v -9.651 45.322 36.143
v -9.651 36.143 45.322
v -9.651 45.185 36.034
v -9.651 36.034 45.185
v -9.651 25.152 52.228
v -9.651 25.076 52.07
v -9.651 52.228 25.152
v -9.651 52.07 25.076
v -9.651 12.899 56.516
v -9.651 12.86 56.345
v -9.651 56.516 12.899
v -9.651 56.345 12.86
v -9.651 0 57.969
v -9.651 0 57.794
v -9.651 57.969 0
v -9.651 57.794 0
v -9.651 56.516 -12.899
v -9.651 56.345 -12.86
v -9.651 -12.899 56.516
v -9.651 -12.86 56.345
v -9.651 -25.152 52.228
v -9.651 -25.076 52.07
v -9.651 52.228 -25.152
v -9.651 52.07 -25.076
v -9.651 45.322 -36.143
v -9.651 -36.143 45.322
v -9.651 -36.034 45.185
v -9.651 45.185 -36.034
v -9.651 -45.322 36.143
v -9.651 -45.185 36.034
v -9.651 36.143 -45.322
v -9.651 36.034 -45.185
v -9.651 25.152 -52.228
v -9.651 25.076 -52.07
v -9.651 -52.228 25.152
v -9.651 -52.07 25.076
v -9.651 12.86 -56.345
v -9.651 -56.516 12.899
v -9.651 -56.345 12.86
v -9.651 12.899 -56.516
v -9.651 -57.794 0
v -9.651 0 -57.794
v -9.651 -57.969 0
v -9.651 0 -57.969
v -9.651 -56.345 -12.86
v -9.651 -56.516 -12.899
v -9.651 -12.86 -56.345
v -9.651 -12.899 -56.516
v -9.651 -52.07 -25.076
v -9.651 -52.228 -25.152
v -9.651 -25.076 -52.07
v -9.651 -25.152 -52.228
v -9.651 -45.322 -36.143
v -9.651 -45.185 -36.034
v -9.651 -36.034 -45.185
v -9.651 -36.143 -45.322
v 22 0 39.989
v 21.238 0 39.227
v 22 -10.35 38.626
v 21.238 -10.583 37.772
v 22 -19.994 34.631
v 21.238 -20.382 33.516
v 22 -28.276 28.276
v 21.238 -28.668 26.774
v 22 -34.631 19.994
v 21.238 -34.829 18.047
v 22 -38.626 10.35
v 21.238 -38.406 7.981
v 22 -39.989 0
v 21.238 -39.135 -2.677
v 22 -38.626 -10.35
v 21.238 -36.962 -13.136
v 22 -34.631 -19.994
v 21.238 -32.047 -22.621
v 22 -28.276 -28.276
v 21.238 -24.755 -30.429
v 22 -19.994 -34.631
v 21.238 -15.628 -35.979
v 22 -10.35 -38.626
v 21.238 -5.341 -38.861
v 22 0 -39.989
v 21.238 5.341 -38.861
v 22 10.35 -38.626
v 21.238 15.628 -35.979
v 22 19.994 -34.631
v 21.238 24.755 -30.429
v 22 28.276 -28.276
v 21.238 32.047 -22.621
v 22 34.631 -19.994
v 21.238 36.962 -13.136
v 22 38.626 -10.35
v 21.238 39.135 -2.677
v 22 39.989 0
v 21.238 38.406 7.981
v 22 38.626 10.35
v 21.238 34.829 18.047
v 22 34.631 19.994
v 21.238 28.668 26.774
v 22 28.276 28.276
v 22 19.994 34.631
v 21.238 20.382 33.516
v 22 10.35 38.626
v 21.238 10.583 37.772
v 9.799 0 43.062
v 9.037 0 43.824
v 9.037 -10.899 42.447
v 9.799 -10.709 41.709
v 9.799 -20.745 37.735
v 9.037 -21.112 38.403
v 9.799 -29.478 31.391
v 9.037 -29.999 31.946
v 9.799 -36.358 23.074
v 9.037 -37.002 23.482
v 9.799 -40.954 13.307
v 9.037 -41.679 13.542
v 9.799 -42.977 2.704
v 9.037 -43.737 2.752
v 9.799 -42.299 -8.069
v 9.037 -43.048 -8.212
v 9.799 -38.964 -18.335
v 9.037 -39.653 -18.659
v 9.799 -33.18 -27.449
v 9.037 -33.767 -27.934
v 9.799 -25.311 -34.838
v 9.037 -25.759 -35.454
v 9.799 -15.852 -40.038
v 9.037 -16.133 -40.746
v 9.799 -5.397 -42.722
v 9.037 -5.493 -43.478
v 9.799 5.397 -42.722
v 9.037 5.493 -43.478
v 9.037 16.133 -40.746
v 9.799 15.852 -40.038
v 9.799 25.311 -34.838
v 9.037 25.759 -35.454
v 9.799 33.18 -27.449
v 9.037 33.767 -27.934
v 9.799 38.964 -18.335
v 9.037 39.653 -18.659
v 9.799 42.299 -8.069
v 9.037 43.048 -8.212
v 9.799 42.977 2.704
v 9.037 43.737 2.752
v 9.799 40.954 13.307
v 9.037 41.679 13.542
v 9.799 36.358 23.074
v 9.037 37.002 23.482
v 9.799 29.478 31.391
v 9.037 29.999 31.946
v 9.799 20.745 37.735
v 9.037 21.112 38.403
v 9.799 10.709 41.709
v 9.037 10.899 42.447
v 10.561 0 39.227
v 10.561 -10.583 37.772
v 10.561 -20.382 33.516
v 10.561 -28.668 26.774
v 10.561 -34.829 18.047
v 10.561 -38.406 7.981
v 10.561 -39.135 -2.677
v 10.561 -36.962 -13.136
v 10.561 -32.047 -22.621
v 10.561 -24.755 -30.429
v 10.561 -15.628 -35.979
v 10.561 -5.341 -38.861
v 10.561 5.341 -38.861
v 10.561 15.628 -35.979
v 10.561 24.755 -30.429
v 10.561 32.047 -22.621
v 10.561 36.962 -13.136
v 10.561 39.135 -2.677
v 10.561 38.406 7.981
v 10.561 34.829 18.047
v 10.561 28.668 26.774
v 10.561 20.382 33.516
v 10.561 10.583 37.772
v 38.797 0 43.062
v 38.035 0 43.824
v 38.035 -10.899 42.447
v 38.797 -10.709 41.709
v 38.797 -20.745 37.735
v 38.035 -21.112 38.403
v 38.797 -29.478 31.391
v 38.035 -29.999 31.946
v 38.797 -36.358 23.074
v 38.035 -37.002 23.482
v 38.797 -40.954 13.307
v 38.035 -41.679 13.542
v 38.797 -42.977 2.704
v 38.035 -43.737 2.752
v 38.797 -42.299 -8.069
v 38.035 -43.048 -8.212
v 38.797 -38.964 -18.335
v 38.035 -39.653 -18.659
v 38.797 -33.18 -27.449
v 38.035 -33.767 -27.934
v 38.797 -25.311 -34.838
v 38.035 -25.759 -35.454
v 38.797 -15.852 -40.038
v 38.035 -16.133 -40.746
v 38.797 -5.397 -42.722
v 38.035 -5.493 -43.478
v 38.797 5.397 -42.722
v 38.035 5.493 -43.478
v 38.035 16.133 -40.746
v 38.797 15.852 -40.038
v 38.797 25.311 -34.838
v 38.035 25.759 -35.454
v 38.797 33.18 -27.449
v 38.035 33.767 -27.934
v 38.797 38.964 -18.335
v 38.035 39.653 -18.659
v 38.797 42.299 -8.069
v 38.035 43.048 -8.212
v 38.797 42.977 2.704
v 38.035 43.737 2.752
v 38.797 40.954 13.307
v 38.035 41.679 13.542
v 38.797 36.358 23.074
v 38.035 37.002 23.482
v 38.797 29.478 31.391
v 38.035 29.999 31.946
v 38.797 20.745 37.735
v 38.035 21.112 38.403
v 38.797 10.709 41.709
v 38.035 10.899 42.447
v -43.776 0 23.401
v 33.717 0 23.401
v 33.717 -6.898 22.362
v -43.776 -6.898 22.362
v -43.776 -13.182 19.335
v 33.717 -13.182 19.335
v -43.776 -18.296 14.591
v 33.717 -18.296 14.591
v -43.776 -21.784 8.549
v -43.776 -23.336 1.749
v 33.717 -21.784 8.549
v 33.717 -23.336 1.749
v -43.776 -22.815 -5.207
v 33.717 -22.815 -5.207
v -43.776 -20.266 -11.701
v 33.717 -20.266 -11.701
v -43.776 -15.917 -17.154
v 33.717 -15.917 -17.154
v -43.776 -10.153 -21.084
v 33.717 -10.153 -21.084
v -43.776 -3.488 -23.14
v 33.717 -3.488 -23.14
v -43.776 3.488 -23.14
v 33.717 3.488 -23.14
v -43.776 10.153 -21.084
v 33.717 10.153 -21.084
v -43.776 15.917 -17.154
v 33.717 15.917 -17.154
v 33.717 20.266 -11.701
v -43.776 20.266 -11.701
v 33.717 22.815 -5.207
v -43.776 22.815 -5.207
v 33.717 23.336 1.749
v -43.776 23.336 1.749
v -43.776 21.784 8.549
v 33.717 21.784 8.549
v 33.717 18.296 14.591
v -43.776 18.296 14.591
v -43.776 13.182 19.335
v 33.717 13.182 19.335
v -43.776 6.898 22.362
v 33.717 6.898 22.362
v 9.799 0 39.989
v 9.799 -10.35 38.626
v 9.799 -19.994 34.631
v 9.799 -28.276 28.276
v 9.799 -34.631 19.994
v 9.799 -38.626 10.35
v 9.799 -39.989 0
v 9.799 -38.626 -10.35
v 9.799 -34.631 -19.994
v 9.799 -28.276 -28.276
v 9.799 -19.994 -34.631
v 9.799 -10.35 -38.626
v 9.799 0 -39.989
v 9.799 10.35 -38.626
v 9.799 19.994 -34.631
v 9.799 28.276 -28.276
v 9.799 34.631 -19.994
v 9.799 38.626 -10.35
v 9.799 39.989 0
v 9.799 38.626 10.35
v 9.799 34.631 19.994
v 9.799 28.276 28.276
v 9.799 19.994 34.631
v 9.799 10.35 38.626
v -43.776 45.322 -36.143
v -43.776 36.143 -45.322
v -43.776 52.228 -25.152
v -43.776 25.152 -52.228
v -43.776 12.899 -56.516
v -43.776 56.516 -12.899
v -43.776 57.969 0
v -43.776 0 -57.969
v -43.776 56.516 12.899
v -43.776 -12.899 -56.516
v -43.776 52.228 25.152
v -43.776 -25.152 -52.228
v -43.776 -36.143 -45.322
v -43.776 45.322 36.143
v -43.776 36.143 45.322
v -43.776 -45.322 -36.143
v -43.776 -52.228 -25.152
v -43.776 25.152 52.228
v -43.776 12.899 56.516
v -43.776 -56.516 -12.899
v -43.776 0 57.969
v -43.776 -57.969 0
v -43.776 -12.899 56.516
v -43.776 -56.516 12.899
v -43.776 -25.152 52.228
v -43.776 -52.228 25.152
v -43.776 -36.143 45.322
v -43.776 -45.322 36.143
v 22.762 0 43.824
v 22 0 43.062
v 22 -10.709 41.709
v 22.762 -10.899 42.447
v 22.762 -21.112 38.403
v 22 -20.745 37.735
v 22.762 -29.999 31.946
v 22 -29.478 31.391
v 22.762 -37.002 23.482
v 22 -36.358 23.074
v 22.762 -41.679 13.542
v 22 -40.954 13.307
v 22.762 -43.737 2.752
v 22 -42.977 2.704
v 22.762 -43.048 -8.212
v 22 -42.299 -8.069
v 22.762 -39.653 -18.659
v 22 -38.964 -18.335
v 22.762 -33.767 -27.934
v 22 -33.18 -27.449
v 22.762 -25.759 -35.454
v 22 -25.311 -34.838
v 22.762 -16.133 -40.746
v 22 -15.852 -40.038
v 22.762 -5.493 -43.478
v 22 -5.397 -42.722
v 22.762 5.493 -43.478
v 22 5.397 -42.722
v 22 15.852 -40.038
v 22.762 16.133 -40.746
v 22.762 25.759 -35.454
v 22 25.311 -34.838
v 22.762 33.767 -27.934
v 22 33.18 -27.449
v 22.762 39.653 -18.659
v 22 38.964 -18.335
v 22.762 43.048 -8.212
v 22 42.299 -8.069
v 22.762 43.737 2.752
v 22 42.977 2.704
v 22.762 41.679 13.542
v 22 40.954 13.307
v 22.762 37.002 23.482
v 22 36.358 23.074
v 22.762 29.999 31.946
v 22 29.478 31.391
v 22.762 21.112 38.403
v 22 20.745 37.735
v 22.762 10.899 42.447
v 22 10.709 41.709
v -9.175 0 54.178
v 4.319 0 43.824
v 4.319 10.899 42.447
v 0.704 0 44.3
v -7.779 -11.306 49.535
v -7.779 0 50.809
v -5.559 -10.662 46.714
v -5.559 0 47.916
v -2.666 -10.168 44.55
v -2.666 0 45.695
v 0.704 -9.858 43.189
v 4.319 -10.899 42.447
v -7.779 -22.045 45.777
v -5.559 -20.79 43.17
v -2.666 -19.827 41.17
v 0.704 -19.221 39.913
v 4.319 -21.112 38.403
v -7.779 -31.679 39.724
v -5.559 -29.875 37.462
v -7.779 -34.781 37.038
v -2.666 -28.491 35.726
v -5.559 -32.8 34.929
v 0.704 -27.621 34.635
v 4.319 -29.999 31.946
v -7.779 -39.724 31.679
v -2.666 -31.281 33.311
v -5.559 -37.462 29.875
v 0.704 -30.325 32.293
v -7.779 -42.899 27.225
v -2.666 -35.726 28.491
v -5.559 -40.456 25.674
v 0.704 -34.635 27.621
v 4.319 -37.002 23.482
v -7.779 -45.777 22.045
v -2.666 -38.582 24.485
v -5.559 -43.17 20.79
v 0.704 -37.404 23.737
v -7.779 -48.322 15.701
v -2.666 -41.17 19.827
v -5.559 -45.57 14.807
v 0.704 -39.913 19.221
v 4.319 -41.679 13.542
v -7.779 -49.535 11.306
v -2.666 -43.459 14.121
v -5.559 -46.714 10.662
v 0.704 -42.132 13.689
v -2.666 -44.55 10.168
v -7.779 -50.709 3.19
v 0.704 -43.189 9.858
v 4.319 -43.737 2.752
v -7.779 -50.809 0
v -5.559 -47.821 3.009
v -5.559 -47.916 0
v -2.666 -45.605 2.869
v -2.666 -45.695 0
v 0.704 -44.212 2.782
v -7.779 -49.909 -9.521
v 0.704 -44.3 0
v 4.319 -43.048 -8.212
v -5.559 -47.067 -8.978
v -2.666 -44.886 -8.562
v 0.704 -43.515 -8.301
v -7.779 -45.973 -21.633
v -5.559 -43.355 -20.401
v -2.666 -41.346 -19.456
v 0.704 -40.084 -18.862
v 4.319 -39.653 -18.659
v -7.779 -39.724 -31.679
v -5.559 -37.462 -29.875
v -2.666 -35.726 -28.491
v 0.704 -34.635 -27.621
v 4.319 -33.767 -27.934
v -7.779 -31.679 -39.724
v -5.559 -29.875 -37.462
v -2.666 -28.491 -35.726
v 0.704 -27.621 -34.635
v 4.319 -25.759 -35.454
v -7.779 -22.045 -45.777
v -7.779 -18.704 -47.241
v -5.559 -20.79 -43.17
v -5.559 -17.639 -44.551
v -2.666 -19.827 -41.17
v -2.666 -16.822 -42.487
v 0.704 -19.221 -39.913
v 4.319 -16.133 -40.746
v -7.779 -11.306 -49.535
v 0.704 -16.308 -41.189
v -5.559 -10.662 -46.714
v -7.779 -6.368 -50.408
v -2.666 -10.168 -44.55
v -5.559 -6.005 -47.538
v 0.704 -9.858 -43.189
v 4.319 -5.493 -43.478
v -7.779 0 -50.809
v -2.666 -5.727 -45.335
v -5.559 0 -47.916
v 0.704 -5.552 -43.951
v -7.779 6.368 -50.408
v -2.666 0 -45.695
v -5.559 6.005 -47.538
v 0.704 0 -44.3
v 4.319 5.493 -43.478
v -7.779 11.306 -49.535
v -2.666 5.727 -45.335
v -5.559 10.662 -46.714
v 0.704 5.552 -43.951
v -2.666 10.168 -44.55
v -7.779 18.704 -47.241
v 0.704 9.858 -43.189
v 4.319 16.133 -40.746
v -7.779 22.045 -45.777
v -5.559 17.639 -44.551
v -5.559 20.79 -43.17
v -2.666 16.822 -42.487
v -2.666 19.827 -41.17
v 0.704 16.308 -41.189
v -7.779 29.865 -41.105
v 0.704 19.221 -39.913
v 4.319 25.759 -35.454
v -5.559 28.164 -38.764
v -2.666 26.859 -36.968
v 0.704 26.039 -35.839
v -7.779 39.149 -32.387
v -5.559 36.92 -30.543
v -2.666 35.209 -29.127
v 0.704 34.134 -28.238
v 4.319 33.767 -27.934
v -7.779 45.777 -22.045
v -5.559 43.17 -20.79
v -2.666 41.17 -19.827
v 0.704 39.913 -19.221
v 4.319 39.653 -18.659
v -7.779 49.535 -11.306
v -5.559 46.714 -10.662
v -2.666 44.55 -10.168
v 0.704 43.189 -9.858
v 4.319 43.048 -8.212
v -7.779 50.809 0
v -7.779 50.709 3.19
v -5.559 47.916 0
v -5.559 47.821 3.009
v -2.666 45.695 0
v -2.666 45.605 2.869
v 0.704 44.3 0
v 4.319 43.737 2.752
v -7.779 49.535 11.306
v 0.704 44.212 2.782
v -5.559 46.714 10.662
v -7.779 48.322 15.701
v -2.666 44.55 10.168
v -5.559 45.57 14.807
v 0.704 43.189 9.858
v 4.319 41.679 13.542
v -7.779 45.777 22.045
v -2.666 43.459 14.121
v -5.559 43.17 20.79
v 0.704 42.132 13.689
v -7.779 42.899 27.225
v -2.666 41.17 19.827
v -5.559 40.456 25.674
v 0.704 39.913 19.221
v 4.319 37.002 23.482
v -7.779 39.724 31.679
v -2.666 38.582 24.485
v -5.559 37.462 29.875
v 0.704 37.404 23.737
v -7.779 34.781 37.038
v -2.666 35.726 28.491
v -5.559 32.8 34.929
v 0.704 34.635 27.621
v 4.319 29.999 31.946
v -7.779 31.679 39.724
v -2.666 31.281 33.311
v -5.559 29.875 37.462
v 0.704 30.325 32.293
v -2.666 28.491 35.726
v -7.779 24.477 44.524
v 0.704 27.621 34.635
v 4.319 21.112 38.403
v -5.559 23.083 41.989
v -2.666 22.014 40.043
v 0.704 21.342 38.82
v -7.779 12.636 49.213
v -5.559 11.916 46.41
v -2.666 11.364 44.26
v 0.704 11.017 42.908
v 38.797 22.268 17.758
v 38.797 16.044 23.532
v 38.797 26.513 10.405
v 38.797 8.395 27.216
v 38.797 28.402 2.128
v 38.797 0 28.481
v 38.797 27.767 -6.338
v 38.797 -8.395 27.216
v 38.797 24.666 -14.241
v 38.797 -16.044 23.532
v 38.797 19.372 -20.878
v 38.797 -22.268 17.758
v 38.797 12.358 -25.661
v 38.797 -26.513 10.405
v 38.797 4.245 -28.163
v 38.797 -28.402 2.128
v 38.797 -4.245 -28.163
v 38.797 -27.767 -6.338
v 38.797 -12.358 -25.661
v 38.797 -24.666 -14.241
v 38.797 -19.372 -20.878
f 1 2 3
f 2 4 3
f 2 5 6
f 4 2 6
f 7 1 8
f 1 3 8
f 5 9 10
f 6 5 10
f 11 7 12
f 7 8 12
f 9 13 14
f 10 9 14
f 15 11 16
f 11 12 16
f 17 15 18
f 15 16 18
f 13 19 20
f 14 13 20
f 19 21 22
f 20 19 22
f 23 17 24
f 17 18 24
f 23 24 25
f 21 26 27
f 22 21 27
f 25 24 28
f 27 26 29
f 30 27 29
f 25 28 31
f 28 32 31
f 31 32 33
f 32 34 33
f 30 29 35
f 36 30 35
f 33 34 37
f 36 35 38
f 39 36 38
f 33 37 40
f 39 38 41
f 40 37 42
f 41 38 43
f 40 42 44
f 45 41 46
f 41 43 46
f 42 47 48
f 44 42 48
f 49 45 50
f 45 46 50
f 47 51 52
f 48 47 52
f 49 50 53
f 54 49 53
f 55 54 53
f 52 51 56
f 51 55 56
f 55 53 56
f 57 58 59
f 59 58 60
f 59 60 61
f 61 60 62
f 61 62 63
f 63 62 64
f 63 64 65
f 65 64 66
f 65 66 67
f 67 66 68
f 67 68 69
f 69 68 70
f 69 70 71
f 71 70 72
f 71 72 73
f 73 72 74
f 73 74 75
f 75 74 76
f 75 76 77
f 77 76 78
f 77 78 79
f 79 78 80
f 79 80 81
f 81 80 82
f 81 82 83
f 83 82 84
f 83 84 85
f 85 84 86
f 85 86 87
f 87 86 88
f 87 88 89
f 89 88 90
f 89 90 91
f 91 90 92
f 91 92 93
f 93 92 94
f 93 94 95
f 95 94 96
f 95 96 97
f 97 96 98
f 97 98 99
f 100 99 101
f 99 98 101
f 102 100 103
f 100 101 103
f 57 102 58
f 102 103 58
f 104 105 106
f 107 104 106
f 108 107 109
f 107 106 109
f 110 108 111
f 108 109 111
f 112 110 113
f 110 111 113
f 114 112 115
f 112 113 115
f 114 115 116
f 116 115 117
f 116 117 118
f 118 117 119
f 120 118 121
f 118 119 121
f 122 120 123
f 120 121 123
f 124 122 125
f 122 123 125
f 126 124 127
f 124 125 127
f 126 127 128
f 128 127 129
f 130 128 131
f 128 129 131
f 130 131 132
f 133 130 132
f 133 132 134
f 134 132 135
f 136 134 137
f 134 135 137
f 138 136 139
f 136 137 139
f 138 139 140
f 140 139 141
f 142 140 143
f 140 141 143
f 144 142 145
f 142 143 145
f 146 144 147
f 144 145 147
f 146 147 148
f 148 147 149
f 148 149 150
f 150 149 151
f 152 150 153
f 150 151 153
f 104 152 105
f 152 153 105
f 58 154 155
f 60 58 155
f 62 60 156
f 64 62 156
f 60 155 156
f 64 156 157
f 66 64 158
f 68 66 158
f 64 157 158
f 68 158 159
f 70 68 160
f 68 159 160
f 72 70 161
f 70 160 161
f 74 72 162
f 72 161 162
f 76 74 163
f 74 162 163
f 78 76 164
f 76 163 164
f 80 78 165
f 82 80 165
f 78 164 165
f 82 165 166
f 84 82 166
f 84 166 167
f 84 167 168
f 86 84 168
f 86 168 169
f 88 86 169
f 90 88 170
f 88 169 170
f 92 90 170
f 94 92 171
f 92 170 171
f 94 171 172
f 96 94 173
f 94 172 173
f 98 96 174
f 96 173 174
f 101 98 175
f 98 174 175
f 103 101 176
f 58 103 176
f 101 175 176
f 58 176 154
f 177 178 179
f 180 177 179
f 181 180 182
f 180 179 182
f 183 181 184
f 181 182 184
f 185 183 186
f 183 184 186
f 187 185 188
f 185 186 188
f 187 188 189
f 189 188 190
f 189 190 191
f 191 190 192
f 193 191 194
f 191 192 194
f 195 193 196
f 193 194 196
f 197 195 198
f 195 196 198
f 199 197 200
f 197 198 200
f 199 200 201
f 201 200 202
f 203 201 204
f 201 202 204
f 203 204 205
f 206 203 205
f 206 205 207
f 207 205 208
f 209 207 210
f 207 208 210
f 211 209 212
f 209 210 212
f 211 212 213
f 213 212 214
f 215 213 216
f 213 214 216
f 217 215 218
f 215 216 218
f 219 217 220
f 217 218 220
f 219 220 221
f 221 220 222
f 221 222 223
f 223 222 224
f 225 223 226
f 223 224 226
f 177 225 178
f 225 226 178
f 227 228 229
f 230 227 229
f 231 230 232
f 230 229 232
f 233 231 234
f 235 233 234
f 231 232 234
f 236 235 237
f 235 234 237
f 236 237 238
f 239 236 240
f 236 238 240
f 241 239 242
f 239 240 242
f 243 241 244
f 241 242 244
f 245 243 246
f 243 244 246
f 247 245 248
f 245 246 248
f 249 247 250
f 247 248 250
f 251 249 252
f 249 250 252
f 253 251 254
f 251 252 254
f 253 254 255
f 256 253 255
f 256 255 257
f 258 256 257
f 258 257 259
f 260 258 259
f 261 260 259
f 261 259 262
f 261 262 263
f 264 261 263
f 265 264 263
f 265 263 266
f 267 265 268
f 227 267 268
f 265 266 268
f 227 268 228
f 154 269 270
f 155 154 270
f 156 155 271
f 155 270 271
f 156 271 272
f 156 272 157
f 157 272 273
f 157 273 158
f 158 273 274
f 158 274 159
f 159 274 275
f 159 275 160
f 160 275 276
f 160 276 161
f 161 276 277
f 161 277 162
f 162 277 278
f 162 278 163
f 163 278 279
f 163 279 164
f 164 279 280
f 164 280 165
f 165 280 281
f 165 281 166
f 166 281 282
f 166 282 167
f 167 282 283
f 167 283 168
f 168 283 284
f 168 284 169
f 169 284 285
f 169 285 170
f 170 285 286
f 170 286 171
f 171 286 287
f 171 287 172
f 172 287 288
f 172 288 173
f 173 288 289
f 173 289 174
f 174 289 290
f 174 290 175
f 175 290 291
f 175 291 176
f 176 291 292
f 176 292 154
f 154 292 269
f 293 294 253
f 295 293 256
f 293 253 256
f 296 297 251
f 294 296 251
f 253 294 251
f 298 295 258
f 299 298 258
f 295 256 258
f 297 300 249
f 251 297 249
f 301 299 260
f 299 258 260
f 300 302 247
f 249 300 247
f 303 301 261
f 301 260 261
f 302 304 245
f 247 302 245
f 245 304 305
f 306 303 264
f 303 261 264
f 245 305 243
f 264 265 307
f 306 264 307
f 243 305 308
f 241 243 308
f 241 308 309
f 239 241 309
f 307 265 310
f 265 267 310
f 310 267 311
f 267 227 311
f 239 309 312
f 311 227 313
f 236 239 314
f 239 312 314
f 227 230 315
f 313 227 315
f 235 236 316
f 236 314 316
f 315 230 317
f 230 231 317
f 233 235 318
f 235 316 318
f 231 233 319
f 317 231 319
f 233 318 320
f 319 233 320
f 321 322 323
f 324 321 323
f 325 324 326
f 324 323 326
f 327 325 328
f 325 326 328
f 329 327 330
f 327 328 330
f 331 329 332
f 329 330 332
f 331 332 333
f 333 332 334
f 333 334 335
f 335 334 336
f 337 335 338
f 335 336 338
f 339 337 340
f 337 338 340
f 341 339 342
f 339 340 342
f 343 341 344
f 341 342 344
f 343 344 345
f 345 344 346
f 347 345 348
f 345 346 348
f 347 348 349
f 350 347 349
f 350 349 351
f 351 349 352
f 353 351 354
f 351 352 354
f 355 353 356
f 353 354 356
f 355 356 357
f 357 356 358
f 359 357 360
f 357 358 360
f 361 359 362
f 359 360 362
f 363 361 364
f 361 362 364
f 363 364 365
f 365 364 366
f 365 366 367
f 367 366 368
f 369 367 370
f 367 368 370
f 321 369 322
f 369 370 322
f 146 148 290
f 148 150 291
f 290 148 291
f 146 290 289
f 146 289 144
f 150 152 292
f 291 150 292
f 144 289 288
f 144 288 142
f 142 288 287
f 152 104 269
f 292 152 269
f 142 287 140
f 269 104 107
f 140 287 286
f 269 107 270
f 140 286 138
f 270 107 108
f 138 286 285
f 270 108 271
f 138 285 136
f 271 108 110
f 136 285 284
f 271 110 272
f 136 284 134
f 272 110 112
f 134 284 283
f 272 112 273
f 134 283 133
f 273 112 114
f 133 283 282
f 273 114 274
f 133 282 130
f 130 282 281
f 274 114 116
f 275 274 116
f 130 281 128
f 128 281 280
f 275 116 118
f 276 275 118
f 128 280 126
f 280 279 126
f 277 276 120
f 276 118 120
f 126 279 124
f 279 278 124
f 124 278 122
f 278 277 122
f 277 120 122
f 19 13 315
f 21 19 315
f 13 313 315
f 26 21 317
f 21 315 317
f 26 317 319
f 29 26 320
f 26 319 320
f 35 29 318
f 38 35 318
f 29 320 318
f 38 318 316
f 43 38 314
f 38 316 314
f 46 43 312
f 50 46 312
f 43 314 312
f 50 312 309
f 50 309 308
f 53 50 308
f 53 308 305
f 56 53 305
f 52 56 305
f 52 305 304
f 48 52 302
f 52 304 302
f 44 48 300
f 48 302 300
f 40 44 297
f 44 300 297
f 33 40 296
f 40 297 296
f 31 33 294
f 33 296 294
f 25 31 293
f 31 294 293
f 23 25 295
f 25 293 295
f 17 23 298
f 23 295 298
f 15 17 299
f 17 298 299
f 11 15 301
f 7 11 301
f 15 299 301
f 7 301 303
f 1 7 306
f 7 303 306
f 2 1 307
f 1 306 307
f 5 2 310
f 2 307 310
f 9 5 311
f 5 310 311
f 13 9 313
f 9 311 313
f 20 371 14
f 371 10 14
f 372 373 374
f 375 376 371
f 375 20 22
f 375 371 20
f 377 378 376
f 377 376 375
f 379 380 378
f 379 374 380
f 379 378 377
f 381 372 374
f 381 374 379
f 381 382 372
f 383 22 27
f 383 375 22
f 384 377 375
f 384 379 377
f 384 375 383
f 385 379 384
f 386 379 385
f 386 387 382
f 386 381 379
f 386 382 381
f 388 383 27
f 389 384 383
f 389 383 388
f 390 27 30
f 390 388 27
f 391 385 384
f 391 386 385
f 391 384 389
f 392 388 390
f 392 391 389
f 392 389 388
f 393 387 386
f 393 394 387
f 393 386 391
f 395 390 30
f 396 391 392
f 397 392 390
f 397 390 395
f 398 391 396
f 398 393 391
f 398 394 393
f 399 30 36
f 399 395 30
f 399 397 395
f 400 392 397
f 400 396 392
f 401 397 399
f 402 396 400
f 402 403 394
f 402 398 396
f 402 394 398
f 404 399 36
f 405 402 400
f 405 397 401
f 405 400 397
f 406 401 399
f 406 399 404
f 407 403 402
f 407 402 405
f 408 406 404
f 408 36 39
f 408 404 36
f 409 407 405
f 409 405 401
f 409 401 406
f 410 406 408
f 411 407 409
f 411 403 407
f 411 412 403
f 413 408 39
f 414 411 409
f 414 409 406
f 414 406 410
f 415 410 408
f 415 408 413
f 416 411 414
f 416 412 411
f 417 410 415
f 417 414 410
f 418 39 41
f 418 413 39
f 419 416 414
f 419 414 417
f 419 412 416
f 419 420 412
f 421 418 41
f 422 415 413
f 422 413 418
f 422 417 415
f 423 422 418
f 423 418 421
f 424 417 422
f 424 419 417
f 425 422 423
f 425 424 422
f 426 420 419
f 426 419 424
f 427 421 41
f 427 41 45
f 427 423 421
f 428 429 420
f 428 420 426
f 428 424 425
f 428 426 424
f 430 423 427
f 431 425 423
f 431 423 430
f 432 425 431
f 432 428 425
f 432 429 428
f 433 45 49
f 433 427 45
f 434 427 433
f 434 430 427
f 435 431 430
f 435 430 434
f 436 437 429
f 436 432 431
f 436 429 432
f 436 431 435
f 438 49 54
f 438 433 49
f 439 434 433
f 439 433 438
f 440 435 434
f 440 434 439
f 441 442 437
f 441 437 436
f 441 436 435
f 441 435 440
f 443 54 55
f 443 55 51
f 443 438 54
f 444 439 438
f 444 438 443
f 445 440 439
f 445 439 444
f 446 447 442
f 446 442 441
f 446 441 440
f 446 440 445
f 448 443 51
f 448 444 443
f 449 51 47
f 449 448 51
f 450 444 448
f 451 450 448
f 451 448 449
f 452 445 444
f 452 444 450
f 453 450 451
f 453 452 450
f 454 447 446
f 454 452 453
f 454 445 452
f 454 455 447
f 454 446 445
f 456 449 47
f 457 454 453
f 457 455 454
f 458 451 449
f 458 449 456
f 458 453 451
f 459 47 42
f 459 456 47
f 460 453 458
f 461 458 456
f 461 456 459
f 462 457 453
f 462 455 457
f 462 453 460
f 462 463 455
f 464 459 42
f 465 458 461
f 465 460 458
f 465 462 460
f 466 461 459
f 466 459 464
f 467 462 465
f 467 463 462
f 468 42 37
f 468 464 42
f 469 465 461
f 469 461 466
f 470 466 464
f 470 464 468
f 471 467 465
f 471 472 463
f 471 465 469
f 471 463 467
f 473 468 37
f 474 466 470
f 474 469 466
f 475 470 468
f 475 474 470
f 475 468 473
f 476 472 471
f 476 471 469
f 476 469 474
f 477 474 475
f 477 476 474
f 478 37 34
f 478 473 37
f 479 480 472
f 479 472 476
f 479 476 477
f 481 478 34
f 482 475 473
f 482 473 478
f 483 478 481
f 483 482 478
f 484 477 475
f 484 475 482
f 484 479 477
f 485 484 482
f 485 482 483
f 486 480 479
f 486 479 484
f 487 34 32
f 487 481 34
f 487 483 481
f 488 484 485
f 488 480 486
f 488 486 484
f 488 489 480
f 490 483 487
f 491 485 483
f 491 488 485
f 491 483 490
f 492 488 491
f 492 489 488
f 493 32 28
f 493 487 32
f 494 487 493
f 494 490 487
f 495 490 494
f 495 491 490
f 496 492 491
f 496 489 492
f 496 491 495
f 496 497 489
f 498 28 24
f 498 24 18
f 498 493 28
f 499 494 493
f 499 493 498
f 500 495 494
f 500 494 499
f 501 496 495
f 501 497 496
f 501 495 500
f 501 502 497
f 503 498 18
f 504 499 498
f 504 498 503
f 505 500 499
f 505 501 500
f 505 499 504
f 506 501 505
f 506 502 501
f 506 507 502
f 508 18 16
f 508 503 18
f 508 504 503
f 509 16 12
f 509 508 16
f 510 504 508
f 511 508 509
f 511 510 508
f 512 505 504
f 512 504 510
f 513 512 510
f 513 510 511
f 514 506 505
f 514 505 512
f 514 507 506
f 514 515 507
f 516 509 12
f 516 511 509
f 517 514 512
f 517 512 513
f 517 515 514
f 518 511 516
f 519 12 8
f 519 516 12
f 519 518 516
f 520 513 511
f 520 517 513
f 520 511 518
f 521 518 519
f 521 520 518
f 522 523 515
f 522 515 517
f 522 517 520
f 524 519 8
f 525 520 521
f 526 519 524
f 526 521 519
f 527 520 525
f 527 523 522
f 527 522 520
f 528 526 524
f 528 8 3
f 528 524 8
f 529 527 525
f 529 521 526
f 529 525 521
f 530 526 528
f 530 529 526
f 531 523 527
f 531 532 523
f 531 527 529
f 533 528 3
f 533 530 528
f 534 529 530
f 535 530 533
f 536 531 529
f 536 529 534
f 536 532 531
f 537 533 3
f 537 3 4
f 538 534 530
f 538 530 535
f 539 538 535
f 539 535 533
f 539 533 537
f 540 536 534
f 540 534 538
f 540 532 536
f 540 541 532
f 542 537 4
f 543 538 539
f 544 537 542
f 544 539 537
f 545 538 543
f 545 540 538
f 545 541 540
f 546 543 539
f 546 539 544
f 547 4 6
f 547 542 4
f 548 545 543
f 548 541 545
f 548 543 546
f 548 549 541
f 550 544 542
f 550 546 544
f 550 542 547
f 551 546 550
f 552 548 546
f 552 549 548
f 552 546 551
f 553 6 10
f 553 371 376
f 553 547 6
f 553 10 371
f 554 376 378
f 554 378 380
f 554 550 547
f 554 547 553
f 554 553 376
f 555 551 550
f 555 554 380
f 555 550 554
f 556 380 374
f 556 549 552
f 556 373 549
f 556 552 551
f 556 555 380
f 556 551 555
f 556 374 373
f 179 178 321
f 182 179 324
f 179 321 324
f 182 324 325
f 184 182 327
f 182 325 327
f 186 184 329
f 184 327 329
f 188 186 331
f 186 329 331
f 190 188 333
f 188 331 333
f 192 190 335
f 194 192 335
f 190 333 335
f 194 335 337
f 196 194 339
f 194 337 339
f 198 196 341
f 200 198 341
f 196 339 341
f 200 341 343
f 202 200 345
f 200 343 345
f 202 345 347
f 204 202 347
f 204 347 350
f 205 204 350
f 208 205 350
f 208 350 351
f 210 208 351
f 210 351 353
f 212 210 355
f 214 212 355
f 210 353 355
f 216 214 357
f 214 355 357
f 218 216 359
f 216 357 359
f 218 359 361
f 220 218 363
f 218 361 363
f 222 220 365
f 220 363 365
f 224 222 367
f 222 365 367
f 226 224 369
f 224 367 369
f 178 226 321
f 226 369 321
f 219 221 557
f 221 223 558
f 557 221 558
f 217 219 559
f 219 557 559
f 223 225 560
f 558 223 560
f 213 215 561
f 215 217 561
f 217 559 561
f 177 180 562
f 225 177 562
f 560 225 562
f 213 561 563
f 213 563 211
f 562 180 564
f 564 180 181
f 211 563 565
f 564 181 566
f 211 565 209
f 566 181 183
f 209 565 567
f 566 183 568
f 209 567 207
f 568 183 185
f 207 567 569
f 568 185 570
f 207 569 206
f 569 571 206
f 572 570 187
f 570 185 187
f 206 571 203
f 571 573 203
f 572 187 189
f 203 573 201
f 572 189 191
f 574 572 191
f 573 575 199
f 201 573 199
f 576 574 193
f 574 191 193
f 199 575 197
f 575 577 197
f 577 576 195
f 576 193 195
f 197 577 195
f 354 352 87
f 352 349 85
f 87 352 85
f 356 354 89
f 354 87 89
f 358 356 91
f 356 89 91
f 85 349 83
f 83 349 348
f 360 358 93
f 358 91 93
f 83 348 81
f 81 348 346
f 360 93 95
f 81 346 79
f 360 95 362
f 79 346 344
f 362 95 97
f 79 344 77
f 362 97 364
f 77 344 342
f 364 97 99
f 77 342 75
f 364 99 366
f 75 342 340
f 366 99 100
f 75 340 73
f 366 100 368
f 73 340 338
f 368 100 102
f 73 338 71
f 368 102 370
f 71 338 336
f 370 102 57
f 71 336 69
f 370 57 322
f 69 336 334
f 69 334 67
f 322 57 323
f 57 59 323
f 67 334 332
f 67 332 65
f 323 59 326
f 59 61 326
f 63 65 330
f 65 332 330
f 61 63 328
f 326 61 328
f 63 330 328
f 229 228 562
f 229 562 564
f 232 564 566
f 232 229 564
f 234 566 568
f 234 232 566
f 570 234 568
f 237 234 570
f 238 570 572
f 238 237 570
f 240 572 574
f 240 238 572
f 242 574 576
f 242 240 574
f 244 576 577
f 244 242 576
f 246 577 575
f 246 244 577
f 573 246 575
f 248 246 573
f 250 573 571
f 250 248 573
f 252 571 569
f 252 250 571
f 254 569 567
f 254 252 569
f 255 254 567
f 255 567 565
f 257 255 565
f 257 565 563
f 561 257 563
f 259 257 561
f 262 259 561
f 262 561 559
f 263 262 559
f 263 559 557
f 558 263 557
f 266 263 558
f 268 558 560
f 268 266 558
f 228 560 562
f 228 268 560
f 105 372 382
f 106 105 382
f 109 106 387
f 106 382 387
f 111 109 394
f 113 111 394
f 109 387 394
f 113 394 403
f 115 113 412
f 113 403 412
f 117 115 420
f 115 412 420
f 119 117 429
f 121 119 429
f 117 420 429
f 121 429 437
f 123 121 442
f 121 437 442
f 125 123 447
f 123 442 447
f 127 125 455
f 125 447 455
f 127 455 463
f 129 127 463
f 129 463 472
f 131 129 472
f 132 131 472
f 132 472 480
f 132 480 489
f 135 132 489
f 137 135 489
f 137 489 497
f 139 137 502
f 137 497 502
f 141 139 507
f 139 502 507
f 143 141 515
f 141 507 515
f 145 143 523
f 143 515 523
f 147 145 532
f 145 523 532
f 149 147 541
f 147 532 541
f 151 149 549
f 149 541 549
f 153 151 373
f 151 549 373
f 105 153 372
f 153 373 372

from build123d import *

# Parameters (mm, degrees)
F2_SIZE = 0.762
F3_SIZE = 5.08
F4_R    = 13.97


with BuildPart() as f1:
    # F0 (on Front) → F1 (revolve)
    with BuildSketch(Plane.XZ):
        Polygon((-9.65059, 57.969252), (-43.776404, 57.969252), (-43.776404, 23.401398), (38.797457, 23.401398), (38.797457, 43.823838), (21.999775, 43.823838), (21.999775, 39.226579), (9.799354, 39.226579), (9.799354, 43.823838), (-9.65059, 43.823838), align=None)
    revolve(axis=Axis((-2.489474, 0, 0), (1, 0, 0)))

    # F2
    f2_edges = [f1.edges().sort_by_distance(p)[0] for p in [
        (38.797457, 0, -43.823838),
        (21.999775, 0, -43.823838),
        (9.799354, 0, -43.823838),
        (9.799354, 0, -39.226579),
        (21.999775, 0, -39.226579),
    ]]
    chamfer(f2_edges, length=F2_SIZE)

    # F3
    f3_edges = [f1.edges().sort_by_distance(p)[0] for p in [
        (38.797457, 0, -23.401398),
    ]]
    chamfer(f3_edges, length=F3_SIZE)

    # F4
    f4_edges = [f1.edges().sort_by_distance(p)[0] for p in [
        (-9.65059, 0, -43.823838),
    ]]
    fillet(f4_edges, radius=F4_R)


solid = f1.part
